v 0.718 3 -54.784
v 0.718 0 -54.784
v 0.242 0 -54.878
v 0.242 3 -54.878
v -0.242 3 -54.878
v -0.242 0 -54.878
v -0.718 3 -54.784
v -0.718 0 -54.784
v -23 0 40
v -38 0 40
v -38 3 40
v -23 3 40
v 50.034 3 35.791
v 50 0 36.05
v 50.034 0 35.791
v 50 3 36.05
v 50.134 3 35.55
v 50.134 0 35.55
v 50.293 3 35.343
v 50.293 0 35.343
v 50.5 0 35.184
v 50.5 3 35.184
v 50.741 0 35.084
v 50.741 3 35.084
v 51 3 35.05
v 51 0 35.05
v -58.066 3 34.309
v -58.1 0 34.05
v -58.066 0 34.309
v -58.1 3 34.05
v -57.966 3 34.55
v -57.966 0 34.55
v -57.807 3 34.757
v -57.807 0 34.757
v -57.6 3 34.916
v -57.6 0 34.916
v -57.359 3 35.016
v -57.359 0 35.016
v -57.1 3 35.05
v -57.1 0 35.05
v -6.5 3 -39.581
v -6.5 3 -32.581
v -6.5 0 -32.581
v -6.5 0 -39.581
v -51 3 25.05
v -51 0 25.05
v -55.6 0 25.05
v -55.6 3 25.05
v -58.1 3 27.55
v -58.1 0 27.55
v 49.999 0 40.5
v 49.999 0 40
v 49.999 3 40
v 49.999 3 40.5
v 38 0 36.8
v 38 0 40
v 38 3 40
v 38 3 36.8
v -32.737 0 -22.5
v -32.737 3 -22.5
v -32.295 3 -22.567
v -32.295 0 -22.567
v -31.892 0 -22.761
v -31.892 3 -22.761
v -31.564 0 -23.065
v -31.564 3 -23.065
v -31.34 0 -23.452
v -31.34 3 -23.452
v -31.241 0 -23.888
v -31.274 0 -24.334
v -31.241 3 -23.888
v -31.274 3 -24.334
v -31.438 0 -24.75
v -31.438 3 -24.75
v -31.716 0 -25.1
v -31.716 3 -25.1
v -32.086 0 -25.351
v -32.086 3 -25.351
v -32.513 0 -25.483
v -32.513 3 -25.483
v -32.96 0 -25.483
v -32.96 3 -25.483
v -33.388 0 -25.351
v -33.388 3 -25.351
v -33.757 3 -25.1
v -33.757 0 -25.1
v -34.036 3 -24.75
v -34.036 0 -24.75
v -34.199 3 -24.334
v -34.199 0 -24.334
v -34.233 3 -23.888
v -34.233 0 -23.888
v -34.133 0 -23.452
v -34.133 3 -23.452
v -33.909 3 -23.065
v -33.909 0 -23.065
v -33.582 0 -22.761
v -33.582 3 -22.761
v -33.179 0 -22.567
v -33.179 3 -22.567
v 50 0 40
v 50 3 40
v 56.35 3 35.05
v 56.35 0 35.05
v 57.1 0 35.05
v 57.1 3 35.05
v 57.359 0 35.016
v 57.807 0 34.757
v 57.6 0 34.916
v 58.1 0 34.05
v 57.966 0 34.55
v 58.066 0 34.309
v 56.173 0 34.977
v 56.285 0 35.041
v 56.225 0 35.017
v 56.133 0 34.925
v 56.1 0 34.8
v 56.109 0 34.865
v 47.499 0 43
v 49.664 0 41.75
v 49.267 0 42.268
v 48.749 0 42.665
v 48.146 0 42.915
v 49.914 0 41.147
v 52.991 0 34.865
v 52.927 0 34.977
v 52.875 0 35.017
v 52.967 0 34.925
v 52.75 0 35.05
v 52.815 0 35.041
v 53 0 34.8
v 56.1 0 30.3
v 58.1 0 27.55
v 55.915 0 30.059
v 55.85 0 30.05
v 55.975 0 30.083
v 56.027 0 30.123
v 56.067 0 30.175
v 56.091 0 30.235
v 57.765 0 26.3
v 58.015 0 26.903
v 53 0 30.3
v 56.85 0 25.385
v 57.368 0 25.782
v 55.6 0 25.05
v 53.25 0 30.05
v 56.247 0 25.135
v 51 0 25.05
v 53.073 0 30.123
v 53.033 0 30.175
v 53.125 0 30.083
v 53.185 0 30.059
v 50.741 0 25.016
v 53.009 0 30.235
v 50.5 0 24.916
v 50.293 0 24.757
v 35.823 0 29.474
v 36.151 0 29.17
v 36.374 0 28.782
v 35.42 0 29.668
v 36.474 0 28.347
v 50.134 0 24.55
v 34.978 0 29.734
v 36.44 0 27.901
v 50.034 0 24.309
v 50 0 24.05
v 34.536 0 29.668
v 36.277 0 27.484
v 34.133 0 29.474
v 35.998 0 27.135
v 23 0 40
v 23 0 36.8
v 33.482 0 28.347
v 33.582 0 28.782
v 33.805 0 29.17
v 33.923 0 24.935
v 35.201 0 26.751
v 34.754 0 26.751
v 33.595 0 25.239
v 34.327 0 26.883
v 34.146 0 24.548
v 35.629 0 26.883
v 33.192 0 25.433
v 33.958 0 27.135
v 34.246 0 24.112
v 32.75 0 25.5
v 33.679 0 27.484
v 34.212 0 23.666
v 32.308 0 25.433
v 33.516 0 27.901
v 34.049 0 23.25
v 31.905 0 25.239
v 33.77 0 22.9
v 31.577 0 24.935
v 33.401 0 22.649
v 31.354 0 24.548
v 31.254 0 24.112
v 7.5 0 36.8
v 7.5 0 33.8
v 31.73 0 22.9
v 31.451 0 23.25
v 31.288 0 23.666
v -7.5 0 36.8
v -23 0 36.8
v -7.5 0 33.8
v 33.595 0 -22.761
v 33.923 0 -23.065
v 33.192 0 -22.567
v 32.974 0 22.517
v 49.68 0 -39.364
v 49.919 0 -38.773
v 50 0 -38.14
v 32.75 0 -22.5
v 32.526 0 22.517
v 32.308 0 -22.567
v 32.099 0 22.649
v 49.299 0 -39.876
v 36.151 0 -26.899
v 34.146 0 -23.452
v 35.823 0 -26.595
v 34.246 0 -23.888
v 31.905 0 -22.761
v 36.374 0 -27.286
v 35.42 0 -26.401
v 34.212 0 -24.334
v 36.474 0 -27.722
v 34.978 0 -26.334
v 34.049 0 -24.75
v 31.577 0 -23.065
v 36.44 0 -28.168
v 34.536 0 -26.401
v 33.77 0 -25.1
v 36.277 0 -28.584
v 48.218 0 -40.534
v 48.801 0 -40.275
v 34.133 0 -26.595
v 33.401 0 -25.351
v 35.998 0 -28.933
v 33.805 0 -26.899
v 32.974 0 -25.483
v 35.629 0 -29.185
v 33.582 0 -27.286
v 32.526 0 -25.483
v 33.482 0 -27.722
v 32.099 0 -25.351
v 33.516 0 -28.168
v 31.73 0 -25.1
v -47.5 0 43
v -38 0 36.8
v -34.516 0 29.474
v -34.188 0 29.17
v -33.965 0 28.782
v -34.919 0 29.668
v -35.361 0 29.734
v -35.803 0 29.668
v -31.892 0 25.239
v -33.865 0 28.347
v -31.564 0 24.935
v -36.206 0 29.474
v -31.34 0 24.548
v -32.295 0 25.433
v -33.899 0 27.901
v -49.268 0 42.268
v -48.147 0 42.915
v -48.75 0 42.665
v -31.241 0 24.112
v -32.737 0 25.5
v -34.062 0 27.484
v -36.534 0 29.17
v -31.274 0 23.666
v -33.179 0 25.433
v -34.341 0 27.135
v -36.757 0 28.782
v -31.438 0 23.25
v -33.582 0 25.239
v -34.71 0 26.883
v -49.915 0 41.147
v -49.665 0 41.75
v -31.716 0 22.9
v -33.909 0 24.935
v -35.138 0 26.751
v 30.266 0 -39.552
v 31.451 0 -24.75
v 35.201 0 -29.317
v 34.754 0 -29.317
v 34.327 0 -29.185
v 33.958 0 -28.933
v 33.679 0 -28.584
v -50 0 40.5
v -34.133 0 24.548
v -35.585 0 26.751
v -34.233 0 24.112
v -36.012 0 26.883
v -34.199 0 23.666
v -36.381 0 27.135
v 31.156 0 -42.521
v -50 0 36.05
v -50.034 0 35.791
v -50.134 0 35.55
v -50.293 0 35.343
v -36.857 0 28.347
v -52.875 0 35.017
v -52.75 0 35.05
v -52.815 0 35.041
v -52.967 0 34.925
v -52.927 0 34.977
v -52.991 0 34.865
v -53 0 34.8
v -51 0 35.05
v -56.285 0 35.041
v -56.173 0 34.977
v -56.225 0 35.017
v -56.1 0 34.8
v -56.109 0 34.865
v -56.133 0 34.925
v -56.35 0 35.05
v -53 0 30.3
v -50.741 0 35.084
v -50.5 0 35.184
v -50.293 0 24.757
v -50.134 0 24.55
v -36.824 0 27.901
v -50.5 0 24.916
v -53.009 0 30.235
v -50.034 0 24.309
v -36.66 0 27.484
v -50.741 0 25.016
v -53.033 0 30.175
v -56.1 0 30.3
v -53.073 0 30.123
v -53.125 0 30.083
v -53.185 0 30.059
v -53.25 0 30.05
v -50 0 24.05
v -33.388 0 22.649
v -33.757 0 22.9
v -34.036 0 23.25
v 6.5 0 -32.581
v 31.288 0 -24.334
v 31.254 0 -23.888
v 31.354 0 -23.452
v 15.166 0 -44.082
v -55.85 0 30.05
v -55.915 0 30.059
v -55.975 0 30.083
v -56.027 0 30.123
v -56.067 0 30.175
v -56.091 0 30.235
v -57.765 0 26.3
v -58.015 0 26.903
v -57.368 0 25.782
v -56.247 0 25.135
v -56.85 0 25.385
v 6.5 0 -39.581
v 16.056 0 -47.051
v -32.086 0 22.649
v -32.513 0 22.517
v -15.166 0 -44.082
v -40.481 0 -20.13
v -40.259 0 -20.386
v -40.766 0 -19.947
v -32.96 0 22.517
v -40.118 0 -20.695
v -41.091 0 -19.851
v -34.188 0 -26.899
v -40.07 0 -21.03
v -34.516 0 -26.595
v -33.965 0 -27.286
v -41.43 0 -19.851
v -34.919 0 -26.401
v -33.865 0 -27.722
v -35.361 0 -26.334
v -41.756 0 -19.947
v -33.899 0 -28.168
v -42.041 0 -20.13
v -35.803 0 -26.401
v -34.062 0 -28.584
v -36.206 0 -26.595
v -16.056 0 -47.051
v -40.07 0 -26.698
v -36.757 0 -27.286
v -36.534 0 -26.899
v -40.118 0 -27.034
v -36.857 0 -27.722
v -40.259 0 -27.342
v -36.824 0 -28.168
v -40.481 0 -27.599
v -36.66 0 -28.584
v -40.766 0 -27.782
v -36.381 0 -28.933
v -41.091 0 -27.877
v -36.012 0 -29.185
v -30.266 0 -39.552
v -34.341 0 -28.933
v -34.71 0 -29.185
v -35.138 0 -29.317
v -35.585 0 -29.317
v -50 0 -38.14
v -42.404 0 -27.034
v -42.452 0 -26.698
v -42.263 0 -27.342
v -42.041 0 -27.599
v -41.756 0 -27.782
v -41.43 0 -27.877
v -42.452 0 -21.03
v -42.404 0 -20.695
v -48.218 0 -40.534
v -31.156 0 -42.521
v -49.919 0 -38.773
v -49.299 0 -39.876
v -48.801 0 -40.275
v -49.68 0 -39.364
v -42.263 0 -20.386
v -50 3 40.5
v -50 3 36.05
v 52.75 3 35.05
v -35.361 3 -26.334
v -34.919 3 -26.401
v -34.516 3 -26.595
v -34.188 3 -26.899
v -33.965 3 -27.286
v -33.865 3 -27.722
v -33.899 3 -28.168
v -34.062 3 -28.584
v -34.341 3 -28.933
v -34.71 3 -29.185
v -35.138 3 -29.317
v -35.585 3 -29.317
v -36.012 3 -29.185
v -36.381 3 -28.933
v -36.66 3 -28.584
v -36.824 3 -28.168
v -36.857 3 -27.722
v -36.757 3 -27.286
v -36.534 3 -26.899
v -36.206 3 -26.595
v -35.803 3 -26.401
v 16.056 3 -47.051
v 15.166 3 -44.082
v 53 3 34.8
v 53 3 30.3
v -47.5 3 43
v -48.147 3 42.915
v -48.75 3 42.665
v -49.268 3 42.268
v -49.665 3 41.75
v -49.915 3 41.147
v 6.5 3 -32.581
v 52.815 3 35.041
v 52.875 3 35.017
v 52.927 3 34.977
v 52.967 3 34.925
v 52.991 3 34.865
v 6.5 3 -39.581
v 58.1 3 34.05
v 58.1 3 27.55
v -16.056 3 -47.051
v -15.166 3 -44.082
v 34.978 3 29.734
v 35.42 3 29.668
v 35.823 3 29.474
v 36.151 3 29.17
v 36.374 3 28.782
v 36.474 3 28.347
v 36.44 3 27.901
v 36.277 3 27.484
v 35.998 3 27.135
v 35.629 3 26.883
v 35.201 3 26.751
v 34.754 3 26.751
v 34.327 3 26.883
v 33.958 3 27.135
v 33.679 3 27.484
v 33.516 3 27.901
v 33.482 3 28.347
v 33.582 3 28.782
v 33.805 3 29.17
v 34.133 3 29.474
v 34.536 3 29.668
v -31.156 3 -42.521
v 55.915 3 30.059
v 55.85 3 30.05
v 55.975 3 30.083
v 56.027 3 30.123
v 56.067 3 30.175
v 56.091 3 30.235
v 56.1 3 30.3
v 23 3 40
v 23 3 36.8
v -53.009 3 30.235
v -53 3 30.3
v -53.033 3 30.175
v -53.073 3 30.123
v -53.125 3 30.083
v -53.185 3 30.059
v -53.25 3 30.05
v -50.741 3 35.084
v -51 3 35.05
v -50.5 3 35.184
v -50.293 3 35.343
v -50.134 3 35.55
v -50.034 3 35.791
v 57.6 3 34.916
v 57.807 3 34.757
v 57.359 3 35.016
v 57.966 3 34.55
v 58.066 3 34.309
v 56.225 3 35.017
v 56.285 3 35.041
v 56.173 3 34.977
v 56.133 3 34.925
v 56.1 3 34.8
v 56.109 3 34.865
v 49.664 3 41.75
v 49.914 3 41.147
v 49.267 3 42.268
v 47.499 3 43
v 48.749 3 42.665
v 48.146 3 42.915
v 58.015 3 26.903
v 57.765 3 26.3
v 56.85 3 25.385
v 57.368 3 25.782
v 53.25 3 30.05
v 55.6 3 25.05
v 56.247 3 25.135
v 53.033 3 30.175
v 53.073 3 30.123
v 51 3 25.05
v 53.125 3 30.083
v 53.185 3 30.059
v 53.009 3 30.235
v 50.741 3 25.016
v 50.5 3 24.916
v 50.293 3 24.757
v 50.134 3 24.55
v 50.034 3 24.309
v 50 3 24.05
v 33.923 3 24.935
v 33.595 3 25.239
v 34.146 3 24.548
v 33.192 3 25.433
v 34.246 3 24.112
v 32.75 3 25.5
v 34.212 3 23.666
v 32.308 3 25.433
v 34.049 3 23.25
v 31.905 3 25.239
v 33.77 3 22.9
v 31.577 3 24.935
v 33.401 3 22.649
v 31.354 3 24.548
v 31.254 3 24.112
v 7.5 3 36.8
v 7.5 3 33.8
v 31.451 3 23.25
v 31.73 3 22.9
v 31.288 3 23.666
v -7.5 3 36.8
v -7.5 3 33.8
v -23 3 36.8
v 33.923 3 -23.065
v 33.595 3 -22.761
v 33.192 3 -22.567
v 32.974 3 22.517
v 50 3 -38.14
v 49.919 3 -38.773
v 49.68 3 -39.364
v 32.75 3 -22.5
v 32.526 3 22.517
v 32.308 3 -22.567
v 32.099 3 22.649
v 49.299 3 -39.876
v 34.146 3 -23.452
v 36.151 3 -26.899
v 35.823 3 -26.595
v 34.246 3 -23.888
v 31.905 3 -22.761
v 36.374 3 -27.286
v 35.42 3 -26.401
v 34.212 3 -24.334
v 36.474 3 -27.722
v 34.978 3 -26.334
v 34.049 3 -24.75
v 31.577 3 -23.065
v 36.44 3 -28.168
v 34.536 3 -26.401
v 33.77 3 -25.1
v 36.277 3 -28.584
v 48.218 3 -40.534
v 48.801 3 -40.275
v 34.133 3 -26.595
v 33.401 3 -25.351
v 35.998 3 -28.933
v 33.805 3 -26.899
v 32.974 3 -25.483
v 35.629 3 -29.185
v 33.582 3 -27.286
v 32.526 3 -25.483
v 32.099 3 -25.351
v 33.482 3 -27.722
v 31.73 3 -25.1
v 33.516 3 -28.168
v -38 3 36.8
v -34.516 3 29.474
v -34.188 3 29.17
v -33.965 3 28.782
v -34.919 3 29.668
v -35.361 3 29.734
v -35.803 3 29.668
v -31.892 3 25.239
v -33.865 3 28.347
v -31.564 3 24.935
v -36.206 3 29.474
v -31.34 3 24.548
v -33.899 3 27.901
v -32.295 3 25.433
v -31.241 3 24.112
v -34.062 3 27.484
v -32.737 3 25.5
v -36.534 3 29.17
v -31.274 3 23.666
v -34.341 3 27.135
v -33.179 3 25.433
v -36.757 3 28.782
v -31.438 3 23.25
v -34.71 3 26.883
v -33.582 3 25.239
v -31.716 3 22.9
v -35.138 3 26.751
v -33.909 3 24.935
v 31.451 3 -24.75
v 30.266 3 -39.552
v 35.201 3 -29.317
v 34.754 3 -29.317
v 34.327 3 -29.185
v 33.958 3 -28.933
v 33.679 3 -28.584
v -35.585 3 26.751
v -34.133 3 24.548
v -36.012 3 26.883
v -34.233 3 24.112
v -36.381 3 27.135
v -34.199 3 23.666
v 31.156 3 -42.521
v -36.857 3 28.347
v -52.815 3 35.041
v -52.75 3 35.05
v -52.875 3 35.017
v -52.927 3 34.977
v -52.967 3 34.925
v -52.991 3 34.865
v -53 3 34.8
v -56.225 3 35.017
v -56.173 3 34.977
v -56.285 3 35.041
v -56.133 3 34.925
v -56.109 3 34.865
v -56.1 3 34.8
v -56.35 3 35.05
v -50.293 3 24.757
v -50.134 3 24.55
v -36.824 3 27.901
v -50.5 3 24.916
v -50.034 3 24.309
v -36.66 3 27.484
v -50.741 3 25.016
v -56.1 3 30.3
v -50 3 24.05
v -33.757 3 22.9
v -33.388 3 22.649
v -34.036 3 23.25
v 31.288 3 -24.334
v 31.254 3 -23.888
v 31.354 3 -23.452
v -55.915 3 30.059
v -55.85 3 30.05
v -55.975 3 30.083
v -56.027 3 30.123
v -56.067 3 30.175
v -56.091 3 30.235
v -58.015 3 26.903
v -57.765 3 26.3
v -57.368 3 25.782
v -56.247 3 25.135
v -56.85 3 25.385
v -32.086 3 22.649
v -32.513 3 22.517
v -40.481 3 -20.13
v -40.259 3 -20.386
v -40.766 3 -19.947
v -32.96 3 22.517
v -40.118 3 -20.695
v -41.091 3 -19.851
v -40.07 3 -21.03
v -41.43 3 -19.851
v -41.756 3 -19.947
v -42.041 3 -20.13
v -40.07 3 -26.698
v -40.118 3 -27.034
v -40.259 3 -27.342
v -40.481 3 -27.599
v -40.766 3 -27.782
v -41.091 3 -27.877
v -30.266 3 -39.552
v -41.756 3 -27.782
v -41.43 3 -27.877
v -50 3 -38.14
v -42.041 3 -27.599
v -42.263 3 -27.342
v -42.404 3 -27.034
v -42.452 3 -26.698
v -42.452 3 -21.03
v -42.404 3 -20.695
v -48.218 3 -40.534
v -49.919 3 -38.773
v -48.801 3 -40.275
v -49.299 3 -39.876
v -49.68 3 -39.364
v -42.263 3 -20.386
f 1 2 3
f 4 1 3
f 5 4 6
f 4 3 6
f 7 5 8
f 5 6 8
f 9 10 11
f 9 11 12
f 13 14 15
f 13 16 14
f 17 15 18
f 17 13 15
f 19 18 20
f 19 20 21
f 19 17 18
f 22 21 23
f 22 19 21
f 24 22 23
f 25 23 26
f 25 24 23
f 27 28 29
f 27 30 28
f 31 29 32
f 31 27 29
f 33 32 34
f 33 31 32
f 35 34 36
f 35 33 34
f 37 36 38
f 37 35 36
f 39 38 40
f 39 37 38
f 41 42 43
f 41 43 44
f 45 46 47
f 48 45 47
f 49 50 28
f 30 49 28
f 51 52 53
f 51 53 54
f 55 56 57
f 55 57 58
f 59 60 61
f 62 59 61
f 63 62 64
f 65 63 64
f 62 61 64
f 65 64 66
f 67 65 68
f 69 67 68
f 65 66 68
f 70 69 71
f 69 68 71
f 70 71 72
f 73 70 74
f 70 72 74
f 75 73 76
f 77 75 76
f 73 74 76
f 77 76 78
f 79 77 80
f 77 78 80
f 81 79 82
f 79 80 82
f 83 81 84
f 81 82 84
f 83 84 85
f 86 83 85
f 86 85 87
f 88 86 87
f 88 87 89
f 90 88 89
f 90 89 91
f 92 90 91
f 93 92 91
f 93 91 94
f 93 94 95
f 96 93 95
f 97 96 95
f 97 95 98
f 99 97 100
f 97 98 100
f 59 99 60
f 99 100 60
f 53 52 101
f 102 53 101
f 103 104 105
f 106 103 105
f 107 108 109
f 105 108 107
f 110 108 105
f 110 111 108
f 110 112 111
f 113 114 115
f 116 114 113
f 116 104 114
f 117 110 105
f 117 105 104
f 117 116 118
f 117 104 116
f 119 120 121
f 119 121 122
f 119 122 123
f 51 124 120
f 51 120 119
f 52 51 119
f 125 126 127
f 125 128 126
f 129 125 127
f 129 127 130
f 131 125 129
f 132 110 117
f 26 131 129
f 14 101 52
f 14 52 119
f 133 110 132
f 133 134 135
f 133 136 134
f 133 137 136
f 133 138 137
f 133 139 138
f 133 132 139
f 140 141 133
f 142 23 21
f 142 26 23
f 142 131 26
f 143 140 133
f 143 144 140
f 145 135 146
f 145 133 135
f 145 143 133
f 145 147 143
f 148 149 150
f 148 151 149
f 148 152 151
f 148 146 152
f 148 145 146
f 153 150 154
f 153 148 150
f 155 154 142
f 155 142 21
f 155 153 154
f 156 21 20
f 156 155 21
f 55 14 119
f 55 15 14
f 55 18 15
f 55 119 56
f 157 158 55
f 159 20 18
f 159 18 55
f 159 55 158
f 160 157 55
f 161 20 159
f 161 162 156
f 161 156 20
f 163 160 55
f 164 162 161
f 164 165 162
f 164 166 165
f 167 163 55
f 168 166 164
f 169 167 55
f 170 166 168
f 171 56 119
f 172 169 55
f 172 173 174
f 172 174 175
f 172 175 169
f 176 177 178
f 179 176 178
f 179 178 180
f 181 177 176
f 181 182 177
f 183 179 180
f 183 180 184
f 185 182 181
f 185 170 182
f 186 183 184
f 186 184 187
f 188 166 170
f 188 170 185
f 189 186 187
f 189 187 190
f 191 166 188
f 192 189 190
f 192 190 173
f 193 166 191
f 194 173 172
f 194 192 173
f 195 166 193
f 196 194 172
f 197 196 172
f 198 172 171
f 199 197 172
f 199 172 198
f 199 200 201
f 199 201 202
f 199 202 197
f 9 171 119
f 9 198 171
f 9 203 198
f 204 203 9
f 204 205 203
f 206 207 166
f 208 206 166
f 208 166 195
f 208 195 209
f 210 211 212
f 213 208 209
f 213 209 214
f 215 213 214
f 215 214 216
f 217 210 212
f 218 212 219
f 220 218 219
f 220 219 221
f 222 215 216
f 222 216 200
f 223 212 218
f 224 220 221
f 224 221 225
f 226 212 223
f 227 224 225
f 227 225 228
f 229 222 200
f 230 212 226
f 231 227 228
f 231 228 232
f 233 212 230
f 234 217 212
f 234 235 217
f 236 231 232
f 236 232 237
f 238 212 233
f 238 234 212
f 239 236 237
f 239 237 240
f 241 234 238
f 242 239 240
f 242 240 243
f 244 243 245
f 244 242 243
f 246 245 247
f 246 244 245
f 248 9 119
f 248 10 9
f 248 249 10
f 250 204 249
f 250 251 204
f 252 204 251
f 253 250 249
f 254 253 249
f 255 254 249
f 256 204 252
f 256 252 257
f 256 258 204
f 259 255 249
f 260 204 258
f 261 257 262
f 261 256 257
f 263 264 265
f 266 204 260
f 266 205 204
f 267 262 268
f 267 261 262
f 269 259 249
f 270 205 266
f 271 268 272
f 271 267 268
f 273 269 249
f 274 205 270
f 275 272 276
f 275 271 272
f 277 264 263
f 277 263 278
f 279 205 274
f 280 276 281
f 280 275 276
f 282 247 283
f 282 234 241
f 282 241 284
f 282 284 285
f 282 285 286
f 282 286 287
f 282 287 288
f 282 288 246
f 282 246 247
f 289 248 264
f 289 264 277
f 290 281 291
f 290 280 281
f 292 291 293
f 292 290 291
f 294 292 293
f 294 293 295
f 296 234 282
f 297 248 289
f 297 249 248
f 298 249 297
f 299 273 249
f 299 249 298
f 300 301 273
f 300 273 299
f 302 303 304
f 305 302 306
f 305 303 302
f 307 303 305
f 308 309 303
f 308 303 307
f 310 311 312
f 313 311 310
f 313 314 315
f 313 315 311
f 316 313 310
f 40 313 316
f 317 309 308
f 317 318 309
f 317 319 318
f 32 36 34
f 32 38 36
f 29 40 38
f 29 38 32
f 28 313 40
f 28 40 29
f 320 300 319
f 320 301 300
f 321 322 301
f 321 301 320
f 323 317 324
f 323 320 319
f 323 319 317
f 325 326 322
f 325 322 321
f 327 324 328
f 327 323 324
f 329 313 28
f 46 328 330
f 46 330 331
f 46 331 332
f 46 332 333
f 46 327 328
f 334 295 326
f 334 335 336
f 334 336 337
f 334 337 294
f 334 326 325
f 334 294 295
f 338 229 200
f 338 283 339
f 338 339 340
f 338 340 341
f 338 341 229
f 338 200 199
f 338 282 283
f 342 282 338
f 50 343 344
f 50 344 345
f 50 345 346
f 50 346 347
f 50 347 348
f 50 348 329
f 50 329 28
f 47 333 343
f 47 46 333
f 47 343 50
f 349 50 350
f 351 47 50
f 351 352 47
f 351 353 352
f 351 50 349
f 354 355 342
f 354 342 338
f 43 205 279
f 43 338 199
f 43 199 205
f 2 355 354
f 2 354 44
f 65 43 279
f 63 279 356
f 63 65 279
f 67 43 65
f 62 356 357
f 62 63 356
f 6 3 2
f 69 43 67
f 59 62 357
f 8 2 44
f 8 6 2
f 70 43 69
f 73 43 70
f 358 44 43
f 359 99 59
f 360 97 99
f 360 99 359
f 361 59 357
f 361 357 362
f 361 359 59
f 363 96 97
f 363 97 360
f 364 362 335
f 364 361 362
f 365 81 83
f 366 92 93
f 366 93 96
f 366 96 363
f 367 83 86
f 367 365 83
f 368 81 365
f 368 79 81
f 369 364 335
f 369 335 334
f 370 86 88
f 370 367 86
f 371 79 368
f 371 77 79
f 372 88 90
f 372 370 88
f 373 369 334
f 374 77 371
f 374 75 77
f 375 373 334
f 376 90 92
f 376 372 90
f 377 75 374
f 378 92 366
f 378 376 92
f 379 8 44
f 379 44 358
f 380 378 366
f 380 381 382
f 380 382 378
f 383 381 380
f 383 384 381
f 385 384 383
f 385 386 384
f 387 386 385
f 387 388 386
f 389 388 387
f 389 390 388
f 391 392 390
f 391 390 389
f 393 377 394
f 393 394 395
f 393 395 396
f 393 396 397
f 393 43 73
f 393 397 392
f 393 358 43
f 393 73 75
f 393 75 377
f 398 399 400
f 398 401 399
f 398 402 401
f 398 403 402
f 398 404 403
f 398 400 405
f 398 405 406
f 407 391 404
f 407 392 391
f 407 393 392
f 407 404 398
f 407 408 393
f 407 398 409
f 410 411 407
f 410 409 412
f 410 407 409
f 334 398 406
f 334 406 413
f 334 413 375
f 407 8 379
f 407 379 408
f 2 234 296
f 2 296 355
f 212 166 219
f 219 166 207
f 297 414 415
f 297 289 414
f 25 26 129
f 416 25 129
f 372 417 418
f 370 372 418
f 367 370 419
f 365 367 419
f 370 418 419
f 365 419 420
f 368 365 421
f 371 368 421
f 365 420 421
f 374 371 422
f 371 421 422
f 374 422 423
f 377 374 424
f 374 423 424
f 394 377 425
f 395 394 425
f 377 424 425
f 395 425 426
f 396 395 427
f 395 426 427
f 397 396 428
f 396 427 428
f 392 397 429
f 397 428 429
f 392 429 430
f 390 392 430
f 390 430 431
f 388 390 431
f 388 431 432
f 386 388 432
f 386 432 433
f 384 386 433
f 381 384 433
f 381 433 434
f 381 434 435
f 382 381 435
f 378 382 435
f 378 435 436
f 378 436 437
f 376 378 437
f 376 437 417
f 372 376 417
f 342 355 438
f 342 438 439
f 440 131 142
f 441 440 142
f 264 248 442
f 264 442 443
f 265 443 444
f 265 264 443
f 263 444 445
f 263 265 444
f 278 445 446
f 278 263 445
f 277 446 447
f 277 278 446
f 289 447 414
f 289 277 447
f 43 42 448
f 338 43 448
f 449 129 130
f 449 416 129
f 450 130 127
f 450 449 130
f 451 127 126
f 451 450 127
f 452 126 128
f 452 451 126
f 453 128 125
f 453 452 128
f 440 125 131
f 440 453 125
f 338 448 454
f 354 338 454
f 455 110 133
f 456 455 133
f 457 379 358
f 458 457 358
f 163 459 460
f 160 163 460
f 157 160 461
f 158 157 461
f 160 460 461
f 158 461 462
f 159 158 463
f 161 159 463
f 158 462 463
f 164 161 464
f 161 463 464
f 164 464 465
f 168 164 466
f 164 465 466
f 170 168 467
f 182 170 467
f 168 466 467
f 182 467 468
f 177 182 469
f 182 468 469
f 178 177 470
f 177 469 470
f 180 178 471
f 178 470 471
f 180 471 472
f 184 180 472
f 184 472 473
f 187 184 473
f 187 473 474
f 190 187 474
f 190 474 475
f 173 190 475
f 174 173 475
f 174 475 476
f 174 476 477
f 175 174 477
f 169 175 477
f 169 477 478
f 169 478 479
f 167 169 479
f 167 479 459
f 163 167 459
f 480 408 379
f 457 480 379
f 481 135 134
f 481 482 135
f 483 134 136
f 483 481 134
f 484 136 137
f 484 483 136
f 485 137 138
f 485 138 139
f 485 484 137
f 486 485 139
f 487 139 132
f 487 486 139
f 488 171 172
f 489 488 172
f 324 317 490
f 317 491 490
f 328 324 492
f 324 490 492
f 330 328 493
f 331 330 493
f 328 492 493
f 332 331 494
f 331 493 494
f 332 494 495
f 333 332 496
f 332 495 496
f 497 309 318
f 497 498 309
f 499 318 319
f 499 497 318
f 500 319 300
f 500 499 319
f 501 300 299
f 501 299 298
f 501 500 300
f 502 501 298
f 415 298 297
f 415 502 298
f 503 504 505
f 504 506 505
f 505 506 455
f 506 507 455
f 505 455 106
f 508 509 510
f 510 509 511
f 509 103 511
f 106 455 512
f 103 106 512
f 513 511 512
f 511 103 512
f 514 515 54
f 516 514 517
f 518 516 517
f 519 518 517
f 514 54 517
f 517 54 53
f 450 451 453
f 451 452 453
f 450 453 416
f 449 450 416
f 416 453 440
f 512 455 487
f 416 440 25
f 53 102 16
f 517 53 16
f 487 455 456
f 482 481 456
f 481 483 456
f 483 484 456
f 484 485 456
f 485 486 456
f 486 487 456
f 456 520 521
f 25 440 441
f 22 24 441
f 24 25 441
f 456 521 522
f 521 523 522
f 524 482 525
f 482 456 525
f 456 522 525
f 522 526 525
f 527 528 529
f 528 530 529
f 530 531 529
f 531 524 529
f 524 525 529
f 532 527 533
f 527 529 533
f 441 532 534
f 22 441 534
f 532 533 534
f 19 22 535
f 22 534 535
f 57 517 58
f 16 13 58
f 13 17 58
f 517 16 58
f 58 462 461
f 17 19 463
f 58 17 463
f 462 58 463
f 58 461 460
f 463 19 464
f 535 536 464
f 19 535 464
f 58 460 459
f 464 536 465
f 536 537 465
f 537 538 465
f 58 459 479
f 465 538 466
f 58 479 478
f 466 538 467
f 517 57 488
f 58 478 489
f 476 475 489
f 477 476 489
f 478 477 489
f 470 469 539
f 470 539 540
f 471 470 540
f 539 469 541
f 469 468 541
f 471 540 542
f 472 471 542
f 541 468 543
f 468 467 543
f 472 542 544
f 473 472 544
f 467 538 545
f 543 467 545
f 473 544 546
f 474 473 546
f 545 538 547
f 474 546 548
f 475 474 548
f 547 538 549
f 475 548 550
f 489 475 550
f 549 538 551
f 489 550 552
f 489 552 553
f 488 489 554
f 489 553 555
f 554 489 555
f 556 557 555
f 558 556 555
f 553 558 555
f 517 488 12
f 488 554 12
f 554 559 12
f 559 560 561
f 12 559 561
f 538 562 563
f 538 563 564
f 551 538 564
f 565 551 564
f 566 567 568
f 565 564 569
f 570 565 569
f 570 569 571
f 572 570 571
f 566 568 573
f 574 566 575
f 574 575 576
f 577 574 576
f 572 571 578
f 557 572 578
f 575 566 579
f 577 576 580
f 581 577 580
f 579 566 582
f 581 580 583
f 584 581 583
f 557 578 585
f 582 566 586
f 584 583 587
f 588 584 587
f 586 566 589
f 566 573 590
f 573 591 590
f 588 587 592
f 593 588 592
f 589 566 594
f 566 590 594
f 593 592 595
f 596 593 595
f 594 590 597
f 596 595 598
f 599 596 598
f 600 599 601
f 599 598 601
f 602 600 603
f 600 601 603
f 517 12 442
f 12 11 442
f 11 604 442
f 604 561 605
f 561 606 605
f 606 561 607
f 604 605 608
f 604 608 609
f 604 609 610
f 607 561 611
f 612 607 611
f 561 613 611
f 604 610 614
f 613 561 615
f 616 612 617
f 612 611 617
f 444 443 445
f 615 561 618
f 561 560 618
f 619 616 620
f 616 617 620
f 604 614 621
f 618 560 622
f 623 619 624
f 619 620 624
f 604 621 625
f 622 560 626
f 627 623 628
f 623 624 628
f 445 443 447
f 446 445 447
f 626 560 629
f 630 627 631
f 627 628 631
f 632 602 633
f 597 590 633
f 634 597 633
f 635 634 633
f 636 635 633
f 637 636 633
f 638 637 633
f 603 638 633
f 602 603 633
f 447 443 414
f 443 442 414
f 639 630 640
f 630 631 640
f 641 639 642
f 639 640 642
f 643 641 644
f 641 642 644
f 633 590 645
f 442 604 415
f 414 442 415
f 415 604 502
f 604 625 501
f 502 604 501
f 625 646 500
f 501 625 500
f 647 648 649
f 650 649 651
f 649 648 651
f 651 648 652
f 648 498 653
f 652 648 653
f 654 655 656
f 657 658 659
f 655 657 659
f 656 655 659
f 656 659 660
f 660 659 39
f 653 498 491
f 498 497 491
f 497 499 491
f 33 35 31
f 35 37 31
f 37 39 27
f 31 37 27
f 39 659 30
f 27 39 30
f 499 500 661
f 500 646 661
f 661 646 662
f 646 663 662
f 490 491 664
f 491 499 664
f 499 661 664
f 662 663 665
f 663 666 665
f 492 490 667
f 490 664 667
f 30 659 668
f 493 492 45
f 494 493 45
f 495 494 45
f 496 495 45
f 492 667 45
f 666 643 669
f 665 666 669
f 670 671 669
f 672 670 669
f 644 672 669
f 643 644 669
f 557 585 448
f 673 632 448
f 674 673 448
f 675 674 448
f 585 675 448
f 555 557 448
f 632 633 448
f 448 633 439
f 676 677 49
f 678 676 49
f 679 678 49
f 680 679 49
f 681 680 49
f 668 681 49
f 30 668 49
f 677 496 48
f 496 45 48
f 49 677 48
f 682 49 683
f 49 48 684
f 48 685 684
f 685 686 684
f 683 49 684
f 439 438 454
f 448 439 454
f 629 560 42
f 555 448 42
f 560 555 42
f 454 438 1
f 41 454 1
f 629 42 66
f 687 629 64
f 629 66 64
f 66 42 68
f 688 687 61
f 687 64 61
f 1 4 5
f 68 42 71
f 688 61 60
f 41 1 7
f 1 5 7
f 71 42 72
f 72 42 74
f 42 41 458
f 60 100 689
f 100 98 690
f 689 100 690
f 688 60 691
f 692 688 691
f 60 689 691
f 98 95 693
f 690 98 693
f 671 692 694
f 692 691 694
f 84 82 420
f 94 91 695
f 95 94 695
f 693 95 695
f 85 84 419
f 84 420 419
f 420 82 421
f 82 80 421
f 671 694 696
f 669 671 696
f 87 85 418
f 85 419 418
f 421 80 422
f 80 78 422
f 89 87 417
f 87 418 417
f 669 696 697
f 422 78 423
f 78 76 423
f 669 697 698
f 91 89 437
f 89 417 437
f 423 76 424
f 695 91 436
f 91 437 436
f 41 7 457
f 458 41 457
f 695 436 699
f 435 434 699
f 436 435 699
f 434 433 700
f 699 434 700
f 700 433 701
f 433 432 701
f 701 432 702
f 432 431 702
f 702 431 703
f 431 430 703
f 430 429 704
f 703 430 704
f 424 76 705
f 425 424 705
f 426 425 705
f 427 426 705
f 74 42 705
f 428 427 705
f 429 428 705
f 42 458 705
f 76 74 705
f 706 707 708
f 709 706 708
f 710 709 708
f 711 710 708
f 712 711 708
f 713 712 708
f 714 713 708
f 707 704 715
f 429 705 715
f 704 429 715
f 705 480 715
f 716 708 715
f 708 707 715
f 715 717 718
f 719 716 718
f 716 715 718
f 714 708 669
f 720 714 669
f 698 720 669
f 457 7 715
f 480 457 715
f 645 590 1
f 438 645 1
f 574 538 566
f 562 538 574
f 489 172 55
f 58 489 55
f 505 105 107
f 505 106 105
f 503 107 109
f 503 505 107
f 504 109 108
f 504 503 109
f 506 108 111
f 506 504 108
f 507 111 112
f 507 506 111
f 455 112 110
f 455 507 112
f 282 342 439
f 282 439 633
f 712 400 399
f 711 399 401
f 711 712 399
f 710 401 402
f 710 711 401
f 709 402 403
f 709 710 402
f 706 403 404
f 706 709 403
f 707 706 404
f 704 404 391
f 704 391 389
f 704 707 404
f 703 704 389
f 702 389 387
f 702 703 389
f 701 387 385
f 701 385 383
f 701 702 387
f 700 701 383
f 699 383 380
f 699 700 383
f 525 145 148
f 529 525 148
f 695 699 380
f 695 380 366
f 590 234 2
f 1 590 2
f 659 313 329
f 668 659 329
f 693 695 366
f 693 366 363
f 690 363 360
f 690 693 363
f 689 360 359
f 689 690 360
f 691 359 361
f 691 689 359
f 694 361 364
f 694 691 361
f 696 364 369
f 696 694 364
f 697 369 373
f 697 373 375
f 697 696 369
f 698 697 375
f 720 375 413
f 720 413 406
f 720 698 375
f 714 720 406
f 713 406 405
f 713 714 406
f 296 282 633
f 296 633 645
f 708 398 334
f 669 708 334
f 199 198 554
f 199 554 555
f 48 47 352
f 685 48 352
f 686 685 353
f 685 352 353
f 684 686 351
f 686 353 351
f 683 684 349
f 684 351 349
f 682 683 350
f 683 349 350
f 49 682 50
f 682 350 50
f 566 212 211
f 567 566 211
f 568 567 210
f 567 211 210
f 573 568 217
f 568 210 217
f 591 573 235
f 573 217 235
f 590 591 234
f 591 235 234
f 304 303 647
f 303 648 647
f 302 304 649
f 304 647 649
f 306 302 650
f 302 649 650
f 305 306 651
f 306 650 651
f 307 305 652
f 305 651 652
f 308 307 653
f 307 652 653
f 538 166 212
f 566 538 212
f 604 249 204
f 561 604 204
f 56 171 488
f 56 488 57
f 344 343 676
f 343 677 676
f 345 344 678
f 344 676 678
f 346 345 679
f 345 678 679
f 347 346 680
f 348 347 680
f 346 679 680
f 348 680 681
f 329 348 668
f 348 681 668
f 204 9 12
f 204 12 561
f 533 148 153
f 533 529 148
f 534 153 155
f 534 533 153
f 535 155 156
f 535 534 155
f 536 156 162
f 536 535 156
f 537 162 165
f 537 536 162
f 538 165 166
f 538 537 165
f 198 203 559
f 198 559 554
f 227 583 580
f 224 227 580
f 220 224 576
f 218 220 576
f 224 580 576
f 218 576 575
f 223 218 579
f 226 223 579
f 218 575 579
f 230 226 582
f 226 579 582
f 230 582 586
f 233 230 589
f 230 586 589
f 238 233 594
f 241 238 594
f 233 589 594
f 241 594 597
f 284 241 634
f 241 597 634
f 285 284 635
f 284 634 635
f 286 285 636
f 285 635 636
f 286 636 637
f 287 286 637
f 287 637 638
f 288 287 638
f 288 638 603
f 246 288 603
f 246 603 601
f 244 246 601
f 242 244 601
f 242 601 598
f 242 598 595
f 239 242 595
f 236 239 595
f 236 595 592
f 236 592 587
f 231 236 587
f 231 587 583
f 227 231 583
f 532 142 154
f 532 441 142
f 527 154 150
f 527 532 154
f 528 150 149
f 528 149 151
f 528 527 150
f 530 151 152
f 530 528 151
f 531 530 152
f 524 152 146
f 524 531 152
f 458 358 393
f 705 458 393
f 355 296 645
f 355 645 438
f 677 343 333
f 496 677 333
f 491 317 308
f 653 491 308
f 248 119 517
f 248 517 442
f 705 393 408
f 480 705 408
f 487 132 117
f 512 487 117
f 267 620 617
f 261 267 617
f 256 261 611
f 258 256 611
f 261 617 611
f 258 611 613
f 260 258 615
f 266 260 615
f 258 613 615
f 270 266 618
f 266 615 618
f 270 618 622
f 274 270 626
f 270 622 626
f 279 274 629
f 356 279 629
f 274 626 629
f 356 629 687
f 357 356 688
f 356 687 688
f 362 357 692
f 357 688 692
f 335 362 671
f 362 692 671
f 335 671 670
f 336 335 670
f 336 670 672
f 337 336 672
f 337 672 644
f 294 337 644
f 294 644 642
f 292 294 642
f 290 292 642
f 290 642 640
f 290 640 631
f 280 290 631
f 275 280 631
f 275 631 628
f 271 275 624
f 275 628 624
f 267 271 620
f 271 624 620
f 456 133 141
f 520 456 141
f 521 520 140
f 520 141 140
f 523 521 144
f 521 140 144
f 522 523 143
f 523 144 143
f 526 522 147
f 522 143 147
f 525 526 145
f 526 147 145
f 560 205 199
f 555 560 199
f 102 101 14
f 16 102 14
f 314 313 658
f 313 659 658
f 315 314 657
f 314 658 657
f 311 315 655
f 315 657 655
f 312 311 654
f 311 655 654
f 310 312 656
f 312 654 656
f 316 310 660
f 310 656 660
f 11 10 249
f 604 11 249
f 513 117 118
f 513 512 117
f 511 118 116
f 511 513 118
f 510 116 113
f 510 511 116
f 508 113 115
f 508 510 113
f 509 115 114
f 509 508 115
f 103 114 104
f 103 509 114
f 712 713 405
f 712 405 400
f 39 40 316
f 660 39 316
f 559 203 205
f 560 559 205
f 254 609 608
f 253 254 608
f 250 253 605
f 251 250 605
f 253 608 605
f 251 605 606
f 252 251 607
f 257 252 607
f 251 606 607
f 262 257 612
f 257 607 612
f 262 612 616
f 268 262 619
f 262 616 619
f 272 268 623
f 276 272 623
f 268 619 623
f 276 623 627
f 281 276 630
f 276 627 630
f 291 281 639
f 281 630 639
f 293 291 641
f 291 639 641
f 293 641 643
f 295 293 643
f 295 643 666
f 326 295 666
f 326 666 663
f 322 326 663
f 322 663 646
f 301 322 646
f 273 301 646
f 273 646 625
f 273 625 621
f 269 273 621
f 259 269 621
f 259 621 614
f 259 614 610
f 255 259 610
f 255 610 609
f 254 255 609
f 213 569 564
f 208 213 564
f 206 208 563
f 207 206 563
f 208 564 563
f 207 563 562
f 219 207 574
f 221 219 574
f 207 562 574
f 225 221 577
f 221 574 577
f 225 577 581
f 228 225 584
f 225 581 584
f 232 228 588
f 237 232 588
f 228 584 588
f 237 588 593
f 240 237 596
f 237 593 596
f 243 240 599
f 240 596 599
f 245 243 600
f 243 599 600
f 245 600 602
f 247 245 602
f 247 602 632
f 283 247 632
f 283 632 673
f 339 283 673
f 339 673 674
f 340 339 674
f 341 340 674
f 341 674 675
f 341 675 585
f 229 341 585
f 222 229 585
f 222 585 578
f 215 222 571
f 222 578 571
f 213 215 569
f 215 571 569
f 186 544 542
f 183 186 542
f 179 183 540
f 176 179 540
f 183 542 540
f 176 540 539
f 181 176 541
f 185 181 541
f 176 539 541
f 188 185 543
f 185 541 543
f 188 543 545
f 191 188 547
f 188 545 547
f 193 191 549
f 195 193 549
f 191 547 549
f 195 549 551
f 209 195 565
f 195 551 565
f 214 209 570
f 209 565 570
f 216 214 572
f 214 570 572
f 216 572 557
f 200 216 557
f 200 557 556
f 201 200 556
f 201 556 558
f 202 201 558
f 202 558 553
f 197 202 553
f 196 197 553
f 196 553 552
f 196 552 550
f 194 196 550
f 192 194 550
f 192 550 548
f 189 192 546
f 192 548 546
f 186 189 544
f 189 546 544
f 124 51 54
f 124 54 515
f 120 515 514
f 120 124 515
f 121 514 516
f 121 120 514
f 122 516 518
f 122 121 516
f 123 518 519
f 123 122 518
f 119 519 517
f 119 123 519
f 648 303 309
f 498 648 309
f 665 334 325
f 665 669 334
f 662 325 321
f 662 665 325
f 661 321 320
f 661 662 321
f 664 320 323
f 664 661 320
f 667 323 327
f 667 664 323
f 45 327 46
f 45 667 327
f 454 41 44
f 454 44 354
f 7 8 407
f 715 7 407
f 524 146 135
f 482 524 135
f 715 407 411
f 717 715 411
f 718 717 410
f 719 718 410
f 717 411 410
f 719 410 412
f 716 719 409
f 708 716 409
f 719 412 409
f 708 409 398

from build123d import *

# Parameters (mm, degrees)
SALIENTE_EXTRUIR1_DEPTH = 3
CROQUIS4_R              = 1.5
CROQUIS4_W              = 15
CROQUIS4_H              = 3.2
CROQUIS4_H_2            = 3
CORTAR_EXTRUIR1_DEPTH   = 3
SALIENTE_EXTRUIR2_DEPTH = 3
REDONDEO1_R             = 1
REDONDEO2_R             = 0.25
CROQUIS6_R              = 1.5
CROQUIS6_W              = 13
CROQUIS6_H              = 7
CORTAR_EXTRUIR2_DEPTH   = 5


with BuildPart() as part:
    # Croquis3 → Saliente-Extruir1 (new body)
    with BuildSketch(Plane(origin=(0, 0, 0), x_dir=(1, 0, 0), z_dir=(0, 1, 0))):
        with BuildLine():
            Line((-50, -40), (50, -40))
            Line((50, -40), (50, -35.05))
            Line((50, -35.05), (53, -35.05))
            Line((53, -35.05), (53, -30.05))
            Line((53, -30.05), (56.1, -30.05))
            Line((56.1, -30.05), (56.1, -35.05))
            Line((56.1, -35.05), (58.1, -35.05))
            Line((58.1, -35.05), (58.1, -27.55))
            ThreePointArc((58.1, -27.55), (57.367766953, -25.782233047), (55.6, -25.05))
            Line((55.6, -25.05), (50, -25.05))
            Line((50, -25.05), (50, 38.139923373))
            ThreePointArc((50, 38.139923373), (49.505732321, 39.632249697), (48.218369714, 40.534489086))
            Line((48.218369714, 40.534489086), (0.718369714, 54.784489086))
            ThreePointArc((0.718369714, 54.784489086), (0, 54.889923373), (-0.718369714, 54.784489086))
            Line((-0.718369714, 54.784489086), (-48.218369714, 40.534489086))
            ThreePointArc((-48.218369714, 40.534489086), (-49.505732321, 39.632249697), (-50, 38.139923373))
            Line((-50, 38.139923373), (-50, -25.05))
            Line((-50, -25.05), (-55.6, -25.05))
            ThreePointArc((-55.6, -25.05), (-57.367766953, -25.782233047), (-58.1, -27.55))
            Line((-58.1, -27.55), (-58.1, -35.05))
            Line((-58.1, -35.05), (-56.1, -35.05))
            Line((-56.1, -35.05), (-56.1, -30.05))
            Line((-56.1, -30.05), (-53, -30.05))
            Line((-53, -30.05), (-53, -35.05))
            Line((-53, -35.05), (-50, -35.05))
            Line((-50, -35.05), (-50, -40))
        make_face()
        Polygon((-31.156326057, 42.52101023), (-16.056326057, 47.05101023), (-15.165547612, 44.081748746), (-30.265547612, 39.551748746), align=None, mode=Mode.SUBTRACT)
        Polygon((15.165547612, 44.081748746), (30.265547612, 39.551748746), (31.156326057, 42.52101023), (16.056326057, 47.05101023), align=None, mode=Mode.SUBTRACT)
    extrude(amount=SALIENTE_EXTRUIR1_DEPTH)

    # Croquis4 → Cortar-Extruir1 (cut, symmetric)
    with BuildSketch(Plane(origin=(0, 3, 0), x_dir=(1, 0, 0), z_dir=(0, 1, 0))):
        with Locations(Location((32.75, 24, 0), (0, 0, 270))):
            Circle(CROQUIS4_R)
        with Locations(Location((-32.736745283, 24, 0), (0, 0, 270))):
            Circle(CROQUIS4_R)
        with Locations(Location((32.75, -24, 0), (0, 0, 270))):
            Circle(CROQUIS4_R)
        with Locations(Location((-32.736745283, -24, 0), (0, 0, 270))):
            Circle(CROQUIS4_R)
        with Locations((-30.5, -38.4)):
            Rectangle(CROQUIS4_W, CROQUIS4_H)
        with Locations((30.5, -38.4)):
            Rectangle(CROQUIS4_W, CROQUIS4_H)
        with Locations((0, -35.3)):
            Rectangle(CROQUIS4_W, CROQUIS4_H_2)
        with BuildLine():
            Line((-40.069692956, 26.698449706), (-40.069692956, 21.030308718))
            ThreePointArc((-40.069692956, 21.030308718), (-41.260824034, 19.839177641), (-42.451955111, 21.030308718))
            Line((-42.451955111, 21.030308718), (-42.451955111, 26.698449706))
            ThreePointArc((-42.451955111, 26.698449706), (-41.260824034, 27.889580784), (-40.069692956, 26.698449706))
        make_face()
    extrude(amount=CORTAR_EXTRUIR1_DEPTH, both=True, mode=Mode.SUBTRACT)

    # Croquis5 → Saliente-Extruir2 (add)
    with BuildSketch(Plane(origin=(0, 0, 0), x_dir=(1, 0, 0), z_dir=(0, 1, 0))):
        with BuildLine():
            Line((-50, -40), (49.999265674, -40))
            Line((49.999265674, -40), (49.999265674, -40.5))
            ThreePointArc((49.999265674, -40.5), (49.267032626, -42.267766953), (47.499265674, -43))
            Line((47.499265674, -43), (-47.5, -43))
            ThreePointArc((-47.5, -43), (-49.267766953, -42.267766953), (-50, -40.5))
            Line((-50, -40.5), (-50, -40))
        make_face()
    extrude(amount=SALIENTE_EXTRUIR2_DEPTH)

    # Redondeo1
    redondeo1_edges = [part.edges().sort_by_distance(p)[0] for p in [
        (-50, 1.5, 35.05),
        (-58.1, 1.5, 35.05),
        (-50, 1.5, 25.05),
        (50, 1.5, 25.05),
        (58.1, 1.5, 35.05),
        (50, 1.5, 35.05),
    ]]
    fillet(redondeo1_edges, radius=REDONDEO1_R)

    # Redondeo2
    redondeo2_edges = [part.edges().sort_by_distance(p)[0] for p in [
        (-53, 1.5, 35.05),
        (-53, 1.5, 30.05),
        (-56.1, 1.5, 30.05),
        (-56.1, 1.5, 35.05),
        (56.1, 1.5, 35.05),
        (56.1, 1.5, 30.05),
        (53, 1.5, 30.05),
        (53, 1.5, 35.05),
    ]]
    fillet(redondeo2_edges, radius=REDONDEO2_R)

    # Croquis6 → Cortar-Extruir2 (cut, symmetric)
    with BuildSketch(Plane(origin=(0, 3, 0), x_dir=(1, 0, 0), z_dir=(0, 1, 0))):
        with Locations(Location((-35.361176909, 27.833892011, 0), (0, 0, 270))):
            Circle(CROQUIS6_R)
        with Locations(Location((34.977904809, 27.833892011, 0), (0, 0, 270))):
            Circle(CROQUIS6_R)
        with Locations(Location((34.977904809, -28.23447772, 0), (0, 0, 270))):
            Circle(CROQUIS6_R)
        with Locations(Location((-35.361176909, -28.23447772, 0), (0, 0, 270))):
            Circle(CROQUIS6_R)
        with Locations((0, 36.081396556)):
            Rectangle(CROQUIS6_W, CROQUIS6_H)
    extrude(amount=CORTAR_EXTRUIR2_DEPTH, both=True, mode=Mode.SUBTRACT)


solid = part.part
